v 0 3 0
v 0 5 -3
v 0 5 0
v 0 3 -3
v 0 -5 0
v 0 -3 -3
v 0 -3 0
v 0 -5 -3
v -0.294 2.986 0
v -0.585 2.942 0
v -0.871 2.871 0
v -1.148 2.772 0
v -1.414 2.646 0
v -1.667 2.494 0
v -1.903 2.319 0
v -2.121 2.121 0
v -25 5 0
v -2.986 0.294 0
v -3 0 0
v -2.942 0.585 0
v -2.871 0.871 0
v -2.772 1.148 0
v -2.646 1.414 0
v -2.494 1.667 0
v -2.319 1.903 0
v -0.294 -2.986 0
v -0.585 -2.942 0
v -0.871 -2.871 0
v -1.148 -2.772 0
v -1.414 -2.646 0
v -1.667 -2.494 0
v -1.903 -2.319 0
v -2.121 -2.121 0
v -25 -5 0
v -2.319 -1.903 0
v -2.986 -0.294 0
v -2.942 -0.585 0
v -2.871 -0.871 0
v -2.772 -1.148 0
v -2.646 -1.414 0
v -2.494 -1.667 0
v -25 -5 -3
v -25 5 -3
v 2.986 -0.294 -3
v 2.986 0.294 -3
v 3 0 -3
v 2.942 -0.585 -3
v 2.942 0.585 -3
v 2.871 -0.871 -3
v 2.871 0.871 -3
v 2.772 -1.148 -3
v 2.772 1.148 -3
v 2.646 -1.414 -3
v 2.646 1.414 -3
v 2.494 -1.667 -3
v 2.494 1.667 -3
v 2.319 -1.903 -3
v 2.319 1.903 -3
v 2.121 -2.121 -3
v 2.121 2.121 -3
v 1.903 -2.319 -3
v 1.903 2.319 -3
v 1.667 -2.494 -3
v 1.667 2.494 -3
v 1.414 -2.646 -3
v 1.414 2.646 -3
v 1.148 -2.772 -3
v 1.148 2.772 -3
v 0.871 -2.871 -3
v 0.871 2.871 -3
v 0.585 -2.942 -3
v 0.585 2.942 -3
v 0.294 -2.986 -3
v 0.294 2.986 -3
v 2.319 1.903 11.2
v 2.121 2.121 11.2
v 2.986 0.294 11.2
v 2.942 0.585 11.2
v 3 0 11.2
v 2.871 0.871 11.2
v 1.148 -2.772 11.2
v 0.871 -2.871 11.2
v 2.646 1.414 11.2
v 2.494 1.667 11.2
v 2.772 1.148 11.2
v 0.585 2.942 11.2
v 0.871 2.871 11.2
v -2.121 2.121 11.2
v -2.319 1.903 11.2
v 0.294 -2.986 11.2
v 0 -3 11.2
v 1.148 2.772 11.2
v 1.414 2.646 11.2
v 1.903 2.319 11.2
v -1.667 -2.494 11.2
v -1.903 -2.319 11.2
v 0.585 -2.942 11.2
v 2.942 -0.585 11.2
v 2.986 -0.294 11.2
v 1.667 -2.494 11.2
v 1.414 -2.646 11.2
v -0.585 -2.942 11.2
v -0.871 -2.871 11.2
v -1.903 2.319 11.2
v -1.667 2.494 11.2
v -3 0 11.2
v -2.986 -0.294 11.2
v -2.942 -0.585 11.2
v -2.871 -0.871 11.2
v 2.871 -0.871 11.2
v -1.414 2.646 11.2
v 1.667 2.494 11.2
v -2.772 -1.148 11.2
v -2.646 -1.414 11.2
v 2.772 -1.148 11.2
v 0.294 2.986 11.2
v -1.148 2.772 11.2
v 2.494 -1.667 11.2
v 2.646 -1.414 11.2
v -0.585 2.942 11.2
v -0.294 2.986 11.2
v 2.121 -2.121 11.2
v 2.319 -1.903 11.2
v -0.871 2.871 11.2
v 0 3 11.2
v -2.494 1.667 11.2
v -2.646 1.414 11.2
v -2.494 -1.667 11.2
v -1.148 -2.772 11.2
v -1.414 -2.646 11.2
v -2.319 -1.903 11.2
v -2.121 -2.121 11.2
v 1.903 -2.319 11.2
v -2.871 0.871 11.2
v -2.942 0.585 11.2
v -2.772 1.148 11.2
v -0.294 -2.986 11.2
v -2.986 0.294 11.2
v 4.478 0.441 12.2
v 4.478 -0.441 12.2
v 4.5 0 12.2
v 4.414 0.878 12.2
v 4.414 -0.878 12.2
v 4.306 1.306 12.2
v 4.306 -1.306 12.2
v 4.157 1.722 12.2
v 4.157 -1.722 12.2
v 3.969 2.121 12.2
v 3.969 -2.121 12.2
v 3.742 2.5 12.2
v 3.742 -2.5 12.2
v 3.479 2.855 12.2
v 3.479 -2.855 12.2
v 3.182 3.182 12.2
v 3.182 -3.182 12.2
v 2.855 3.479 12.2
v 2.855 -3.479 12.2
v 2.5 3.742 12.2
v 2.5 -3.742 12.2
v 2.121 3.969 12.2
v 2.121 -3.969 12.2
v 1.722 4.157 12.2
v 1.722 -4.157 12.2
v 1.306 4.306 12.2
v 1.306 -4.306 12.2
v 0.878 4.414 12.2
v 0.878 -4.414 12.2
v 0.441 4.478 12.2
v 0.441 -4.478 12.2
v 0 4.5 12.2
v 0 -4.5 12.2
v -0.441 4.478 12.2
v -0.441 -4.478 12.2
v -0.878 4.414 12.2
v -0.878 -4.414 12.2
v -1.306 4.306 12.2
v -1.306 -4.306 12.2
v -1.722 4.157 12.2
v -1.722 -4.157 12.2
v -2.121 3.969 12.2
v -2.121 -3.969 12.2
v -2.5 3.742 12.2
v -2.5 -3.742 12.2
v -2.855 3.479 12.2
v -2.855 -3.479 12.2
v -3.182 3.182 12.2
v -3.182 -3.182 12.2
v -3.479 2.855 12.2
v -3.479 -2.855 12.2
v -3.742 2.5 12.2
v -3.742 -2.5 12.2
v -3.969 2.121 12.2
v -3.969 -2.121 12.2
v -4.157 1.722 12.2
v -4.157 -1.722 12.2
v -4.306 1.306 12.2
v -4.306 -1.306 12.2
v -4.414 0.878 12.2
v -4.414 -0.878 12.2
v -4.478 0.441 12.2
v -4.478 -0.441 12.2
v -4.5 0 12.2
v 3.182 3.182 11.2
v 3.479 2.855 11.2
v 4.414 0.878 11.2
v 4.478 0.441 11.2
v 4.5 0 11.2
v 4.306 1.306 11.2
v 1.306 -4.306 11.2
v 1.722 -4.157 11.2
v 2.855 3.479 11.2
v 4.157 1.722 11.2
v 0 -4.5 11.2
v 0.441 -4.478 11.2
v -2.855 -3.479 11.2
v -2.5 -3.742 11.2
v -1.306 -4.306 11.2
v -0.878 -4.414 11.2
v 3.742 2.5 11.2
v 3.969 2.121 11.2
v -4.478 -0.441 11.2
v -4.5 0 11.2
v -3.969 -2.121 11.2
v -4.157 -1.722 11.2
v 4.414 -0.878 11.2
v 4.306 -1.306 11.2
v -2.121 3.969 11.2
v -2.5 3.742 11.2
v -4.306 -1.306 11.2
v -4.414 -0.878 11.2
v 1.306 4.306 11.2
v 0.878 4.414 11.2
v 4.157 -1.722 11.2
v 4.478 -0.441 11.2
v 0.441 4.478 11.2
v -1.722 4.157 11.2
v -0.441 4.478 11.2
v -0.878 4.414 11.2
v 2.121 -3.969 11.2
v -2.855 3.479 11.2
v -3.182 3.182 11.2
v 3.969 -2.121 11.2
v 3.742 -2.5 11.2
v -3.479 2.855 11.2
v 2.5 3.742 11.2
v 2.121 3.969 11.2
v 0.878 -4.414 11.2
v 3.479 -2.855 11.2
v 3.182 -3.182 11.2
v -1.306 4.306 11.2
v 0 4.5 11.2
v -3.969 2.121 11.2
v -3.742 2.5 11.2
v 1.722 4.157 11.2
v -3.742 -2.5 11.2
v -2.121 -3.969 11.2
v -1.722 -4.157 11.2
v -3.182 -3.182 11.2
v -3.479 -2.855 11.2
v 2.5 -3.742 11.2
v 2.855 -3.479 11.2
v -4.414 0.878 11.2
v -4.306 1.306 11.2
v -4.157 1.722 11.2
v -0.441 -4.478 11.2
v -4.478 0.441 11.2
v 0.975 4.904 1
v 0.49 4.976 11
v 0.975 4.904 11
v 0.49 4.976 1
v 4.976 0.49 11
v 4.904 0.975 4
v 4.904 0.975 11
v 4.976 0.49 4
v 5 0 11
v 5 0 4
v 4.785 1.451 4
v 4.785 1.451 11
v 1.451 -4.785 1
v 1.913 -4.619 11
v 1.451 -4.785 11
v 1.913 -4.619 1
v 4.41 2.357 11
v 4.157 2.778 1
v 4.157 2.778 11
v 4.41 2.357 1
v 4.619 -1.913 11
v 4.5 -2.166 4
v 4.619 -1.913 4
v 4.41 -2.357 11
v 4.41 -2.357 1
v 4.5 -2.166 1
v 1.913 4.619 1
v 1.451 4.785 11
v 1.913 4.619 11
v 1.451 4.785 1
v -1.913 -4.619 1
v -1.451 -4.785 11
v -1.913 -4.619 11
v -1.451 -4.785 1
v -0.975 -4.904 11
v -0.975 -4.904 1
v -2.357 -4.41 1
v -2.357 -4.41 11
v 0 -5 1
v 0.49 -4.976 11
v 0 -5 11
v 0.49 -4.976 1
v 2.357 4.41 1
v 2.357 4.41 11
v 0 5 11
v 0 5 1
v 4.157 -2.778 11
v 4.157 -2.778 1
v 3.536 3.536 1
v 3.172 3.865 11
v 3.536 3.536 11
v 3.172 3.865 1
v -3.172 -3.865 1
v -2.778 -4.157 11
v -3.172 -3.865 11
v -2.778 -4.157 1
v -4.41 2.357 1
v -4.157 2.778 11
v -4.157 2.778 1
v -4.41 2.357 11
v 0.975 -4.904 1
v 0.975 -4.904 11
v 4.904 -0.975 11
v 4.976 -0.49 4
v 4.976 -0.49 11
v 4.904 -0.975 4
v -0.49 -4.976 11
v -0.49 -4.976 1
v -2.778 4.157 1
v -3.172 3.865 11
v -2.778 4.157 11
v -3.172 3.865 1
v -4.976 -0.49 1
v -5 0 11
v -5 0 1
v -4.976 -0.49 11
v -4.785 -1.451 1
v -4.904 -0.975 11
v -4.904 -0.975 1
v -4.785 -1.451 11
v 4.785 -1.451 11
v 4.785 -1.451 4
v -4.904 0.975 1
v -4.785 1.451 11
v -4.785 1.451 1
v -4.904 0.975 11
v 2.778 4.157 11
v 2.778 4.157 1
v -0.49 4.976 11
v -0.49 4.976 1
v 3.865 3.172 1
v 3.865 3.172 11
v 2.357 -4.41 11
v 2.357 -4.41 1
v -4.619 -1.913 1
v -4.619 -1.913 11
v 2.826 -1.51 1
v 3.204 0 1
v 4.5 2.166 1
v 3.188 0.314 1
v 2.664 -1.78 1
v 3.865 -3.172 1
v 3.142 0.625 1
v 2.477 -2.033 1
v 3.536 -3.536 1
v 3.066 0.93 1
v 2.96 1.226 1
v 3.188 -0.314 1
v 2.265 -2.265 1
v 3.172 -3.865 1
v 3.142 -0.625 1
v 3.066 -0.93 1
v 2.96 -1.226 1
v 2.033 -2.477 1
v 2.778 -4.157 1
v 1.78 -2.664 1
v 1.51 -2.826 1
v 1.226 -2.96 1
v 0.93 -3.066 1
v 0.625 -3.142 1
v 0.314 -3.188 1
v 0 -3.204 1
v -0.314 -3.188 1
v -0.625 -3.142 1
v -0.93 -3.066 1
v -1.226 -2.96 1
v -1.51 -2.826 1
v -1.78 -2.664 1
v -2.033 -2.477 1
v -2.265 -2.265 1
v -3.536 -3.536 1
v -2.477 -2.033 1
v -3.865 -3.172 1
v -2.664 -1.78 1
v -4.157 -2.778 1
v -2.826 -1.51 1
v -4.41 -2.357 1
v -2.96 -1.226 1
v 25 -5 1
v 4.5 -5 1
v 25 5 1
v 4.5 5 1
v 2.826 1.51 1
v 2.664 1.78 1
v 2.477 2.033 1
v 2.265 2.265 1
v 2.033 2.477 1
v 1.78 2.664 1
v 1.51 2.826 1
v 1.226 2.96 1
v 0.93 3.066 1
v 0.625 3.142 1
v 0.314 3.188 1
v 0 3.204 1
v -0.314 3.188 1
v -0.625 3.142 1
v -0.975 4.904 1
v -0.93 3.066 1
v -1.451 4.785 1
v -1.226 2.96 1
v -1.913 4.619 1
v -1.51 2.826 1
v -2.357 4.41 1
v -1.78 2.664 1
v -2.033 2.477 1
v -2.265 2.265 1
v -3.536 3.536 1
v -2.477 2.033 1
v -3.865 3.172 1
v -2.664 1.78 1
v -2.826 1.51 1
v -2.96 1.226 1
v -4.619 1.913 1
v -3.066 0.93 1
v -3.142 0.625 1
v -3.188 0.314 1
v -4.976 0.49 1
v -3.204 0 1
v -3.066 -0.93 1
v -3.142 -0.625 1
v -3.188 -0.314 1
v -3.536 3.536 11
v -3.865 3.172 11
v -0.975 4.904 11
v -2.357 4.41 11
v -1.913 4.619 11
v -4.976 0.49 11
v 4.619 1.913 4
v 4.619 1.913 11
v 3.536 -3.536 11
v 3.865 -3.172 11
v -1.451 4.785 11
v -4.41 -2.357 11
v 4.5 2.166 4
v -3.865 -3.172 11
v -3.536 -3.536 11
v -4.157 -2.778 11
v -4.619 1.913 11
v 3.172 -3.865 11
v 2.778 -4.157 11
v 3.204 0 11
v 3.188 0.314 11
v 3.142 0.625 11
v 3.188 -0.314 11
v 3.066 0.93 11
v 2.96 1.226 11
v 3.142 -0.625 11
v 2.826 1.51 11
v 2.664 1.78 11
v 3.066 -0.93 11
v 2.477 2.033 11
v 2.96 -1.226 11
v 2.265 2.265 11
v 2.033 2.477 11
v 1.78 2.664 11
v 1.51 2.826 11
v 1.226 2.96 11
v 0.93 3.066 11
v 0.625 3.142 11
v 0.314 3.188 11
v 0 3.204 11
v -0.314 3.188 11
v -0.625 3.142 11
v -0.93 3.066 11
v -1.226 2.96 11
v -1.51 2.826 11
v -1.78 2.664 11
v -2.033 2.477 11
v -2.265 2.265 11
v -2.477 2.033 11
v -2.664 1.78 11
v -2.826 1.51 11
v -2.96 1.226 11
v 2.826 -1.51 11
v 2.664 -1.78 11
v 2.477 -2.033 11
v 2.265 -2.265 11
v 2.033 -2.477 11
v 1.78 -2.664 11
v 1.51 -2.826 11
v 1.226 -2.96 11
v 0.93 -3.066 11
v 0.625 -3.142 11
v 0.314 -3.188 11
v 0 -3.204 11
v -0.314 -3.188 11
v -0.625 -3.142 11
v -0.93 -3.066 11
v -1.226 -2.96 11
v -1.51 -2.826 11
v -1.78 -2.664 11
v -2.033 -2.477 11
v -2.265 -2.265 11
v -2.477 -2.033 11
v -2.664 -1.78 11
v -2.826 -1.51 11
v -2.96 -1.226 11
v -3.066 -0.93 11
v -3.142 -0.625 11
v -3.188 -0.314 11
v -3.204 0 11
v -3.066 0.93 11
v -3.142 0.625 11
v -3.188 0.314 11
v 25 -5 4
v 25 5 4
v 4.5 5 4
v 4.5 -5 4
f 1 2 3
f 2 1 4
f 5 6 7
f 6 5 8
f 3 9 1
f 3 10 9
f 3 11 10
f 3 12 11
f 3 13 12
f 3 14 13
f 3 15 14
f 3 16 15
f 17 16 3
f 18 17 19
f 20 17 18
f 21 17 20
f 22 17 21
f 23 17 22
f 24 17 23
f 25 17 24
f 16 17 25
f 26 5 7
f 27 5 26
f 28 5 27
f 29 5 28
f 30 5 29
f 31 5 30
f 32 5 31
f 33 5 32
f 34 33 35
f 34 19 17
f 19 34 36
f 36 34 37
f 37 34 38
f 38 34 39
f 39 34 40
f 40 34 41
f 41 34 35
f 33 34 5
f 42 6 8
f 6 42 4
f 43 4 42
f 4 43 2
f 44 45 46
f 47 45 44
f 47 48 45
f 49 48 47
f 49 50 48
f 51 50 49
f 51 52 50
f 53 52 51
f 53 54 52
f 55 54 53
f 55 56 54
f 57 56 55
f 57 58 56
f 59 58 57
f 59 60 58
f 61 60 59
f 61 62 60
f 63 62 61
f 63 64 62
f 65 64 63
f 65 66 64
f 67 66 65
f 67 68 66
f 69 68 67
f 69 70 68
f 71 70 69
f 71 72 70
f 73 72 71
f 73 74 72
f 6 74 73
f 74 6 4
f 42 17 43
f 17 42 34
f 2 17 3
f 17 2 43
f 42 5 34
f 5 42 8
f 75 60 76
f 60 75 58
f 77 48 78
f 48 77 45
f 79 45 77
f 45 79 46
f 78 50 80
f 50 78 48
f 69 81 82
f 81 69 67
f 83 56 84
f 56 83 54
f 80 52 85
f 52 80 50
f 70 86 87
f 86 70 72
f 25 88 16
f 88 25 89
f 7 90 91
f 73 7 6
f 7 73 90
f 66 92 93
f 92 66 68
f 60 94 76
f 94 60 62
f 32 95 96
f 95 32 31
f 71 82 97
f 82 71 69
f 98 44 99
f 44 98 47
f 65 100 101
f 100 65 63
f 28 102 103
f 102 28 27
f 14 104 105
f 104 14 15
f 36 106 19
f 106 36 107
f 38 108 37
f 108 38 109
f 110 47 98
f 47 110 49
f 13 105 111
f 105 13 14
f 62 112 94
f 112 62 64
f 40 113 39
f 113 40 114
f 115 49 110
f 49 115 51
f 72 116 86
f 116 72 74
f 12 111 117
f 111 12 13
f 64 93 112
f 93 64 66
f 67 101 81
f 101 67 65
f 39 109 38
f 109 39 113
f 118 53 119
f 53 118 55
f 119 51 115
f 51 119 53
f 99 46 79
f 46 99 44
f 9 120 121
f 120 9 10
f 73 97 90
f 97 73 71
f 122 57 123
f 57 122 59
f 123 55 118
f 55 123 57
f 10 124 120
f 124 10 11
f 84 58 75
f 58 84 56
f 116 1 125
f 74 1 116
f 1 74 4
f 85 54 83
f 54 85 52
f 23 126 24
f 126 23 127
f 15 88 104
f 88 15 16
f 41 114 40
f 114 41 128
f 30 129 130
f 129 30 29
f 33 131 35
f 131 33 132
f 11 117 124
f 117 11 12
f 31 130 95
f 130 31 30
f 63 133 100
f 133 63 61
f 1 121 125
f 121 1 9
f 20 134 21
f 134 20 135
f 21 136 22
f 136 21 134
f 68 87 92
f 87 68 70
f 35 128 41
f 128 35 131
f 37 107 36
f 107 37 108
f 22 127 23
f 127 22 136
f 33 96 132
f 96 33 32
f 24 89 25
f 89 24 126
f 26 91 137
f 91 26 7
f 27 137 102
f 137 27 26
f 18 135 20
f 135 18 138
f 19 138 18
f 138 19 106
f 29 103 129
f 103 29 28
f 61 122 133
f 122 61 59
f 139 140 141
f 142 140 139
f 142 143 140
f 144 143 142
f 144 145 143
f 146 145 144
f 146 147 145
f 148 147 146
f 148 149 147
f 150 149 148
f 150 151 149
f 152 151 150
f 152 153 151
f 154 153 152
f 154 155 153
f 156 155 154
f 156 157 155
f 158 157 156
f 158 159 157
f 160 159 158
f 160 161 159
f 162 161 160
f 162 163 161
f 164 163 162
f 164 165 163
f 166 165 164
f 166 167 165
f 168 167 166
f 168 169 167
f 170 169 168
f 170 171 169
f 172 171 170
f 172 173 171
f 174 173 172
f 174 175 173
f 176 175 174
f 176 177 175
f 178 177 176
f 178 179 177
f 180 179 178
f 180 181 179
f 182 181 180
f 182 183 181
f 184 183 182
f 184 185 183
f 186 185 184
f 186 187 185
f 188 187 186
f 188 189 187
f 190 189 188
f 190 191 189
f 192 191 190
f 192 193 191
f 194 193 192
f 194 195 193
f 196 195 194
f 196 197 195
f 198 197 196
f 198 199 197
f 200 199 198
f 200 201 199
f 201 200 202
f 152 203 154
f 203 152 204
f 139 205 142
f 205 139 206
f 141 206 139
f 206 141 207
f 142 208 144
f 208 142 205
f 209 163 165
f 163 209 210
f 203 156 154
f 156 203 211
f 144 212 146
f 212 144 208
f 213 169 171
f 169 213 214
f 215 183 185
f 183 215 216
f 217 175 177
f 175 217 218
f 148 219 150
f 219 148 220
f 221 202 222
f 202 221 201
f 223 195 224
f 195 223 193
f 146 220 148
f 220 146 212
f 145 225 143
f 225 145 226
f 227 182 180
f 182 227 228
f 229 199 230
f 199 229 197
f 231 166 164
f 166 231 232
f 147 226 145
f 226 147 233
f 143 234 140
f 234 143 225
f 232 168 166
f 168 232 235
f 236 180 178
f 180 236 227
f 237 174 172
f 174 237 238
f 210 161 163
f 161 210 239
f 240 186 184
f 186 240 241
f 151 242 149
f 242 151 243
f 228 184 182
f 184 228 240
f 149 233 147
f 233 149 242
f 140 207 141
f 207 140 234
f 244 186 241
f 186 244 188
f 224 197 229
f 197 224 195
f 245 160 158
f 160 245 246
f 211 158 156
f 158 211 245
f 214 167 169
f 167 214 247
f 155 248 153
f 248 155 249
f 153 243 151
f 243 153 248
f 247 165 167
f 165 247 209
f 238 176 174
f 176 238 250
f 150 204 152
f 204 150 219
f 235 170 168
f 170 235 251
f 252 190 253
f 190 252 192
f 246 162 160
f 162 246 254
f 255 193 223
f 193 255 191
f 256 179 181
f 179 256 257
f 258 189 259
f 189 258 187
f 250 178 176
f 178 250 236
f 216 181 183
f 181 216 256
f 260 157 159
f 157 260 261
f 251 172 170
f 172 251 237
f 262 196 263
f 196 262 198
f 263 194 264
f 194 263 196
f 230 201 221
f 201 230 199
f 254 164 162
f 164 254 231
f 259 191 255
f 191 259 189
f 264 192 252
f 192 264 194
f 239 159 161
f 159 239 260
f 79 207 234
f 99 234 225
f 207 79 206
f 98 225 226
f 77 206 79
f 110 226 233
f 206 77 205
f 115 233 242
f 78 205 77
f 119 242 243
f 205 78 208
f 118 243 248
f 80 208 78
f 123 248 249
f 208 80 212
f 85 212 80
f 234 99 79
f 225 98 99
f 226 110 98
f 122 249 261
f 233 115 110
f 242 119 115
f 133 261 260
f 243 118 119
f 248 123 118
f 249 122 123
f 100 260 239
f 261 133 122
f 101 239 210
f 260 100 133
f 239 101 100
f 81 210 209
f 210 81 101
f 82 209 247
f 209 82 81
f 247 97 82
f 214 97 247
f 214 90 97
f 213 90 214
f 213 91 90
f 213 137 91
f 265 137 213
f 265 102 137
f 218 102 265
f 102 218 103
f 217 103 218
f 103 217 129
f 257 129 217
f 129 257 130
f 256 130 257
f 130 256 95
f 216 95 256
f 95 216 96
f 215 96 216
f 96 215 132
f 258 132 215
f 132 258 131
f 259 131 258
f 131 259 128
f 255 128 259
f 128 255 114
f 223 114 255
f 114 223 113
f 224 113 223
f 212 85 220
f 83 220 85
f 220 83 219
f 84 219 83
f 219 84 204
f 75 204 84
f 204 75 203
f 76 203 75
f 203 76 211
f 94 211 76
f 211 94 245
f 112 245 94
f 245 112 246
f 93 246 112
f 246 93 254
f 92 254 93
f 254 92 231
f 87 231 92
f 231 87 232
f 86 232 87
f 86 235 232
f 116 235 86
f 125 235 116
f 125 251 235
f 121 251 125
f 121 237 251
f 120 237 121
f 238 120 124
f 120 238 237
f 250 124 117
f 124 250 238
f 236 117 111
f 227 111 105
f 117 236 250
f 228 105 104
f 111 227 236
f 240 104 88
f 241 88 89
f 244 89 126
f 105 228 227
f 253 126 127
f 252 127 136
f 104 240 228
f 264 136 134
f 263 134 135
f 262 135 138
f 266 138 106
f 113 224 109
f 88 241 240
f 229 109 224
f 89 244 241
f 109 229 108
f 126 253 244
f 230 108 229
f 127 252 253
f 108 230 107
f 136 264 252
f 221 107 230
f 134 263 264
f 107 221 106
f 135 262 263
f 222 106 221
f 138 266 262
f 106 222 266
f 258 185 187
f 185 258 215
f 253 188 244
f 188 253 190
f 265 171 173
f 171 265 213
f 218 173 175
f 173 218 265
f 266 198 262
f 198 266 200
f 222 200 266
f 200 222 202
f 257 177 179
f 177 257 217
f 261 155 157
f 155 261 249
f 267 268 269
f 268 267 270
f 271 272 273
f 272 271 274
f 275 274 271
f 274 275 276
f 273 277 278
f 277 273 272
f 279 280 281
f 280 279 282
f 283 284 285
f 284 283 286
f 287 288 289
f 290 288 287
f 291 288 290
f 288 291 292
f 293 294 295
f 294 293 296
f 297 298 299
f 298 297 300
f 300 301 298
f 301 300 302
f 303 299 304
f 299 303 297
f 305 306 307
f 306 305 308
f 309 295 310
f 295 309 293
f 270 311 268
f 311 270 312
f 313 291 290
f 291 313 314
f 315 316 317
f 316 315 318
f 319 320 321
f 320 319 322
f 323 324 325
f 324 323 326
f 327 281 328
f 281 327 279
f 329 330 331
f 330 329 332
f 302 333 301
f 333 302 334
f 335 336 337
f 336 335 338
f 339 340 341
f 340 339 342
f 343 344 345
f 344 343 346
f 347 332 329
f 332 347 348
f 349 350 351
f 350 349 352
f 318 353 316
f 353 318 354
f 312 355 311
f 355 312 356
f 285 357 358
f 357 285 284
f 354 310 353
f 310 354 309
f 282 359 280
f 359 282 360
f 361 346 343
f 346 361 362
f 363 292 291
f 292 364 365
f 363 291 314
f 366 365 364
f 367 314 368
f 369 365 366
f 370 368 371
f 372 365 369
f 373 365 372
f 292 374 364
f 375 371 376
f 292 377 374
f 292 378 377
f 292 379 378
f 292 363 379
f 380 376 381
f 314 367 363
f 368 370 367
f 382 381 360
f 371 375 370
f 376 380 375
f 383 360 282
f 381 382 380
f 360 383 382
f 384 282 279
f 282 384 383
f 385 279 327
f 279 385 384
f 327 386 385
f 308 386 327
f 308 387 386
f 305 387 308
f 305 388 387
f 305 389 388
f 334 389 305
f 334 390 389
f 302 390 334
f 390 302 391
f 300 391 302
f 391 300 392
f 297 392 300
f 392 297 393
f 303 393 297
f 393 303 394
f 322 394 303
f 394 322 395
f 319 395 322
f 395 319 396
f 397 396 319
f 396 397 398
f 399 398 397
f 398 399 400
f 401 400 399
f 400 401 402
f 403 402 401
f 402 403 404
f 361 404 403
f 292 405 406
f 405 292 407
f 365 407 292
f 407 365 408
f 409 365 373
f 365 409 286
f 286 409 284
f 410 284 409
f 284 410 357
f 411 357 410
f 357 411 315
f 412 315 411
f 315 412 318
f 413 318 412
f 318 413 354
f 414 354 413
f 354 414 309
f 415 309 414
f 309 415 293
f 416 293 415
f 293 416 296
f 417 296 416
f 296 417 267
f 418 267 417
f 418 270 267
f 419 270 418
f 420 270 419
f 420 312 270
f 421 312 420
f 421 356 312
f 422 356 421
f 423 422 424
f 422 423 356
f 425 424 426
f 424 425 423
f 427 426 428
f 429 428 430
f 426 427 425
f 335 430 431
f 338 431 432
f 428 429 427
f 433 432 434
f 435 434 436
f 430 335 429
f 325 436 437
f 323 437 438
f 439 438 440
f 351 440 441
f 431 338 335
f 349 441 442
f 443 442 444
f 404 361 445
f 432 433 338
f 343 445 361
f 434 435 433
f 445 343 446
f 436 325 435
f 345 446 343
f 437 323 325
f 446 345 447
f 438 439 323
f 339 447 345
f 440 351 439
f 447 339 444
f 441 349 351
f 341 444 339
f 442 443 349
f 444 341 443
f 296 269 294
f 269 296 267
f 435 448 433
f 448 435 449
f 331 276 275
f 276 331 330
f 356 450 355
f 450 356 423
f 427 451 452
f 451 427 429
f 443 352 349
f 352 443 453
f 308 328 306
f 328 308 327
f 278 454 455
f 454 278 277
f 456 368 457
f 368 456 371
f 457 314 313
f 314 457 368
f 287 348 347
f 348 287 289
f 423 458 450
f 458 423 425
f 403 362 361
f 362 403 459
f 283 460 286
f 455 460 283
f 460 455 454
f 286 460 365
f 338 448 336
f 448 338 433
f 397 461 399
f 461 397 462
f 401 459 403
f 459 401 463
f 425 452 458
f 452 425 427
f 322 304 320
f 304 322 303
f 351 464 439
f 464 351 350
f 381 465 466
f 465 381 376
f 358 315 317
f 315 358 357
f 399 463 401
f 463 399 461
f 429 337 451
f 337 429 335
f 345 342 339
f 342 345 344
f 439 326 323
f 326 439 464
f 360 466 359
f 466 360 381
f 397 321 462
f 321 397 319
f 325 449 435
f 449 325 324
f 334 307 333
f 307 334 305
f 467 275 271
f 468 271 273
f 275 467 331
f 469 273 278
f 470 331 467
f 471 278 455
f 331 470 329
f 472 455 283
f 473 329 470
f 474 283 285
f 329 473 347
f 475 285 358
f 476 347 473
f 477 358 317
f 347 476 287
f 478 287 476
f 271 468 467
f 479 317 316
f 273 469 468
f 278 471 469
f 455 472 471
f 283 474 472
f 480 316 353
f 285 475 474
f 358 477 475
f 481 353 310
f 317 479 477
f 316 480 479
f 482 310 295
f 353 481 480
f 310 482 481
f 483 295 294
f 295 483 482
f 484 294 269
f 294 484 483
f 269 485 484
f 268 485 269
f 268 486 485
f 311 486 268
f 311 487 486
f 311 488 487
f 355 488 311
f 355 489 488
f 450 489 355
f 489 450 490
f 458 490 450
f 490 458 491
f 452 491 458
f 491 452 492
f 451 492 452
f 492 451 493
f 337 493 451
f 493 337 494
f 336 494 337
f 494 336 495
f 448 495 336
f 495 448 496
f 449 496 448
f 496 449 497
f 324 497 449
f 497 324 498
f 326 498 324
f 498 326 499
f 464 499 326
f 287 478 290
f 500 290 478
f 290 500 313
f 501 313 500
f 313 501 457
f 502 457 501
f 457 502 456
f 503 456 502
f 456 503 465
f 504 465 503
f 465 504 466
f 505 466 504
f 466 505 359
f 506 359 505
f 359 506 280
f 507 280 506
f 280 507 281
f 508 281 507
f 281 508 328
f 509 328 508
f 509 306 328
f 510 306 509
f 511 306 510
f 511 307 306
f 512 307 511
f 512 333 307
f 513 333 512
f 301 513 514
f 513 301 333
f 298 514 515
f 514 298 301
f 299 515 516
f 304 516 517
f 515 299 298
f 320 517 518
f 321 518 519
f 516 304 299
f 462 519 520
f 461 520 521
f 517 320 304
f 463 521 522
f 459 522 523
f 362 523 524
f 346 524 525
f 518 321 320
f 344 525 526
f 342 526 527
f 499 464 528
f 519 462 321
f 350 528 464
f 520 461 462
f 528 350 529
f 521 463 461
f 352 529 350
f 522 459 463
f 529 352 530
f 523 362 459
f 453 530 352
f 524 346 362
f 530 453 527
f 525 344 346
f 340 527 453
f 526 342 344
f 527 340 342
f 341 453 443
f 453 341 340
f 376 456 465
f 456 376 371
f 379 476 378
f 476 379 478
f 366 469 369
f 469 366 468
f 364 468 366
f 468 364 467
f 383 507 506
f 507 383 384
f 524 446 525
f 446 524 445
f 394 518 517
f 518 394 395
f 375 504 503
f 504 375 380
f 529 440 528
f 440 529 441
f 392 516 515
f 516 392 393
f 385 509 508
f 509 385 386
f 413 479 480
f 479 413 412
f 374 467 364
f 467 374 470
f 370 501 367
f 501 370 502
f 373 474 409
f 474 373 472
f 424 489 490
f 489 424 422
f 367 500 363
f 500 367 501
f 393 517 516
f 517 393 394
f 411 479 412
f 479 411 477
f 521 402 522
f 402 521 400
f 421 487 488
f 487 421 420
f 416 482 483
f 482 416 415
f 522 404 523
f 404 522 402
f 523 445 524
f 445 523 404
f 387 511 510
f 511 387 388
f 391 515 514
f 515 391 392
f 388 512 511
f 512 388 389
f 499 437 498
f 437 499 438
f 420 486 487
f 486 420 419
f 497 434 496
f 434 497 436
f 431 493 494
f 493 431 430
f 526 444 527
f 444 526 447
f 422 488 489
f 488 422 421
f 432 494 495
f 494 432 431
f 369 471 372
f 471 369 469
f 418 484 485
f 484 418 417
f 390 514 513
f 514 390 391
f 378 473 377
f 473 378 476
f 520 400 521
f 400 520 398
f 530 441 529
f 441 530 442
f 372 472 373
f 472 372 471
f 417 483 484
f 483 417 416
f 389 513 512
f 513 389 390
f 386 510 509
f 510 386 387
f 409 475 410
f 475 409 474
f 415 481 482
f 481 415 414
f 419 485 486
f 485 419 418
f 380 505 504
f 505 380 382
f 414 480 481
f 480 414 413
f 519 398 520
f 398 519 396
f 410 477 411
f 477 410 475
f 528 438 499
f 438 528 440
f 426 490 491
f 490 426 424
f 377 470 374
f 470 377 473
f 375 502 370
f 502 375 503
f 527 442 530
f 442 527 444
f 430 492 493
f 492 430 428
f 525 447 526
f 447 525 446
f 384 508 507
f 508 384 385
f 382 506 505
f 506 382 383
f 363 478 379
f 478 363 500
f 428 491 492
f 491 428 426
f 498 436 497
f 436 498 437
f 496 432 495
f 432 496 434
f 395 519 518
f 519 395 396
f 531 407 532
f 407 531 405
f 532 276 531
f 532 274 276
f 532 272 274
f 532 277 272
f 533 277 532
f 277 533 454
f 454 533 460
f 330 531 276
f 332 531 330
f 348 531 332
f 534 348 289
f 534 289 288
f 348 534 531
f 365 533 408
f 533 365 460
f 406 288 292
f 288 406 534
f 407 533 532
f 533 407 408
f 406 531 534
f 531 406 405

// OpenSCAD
// Reference submission for hinge-captured-45.
//
// The pin runs past the knuckle and carries a head above it. The 0.2 mm gap
// between the knuckle top (z = 11) and the head bottom (z = 11.2) is what makes
// the part separable at the assembled pose; pulling 2 mm closes that gap and
// the head blocks the knuckle annulus, so `axial-retention` passes.
//
// This is the trade-off the task states: the part is captured, so it is not
// axially removable and no disassembly-path is required.
agentscad_part = "all";
hinge_angle = 0;   // pose control: the benchmark re-renders the moving part at this angle
$fn = 64;

bore_d = 6.40 / cos(180 / $fn);

module fixed_leaf() {
  union() {
    translate([-25, -5, -3]) cube([25, 10, 3]);
    translate([0, 0, -3]) cylinder(h = 15.2, d = 6);      // pin, top at 12.2
    translate([0, 0, 11.2]) cylinder(h = 1, d = 9);        // retention head, 11.2 .. 12.2
  }
}

module moving_leaf() {
  union() {
    difference() {
      translate([0, 0, 1]) cylinder(h = 10, d = 10);       // knuckle, 1 .. 11
      translate([0, 0, 0.9]) cylinder(h = 10.2, d = bore_d);
    }
    translate([4.5, -5, 1]) cube([20.5, 10, 3]);
  }
}

module generated_part() {
  if (agentscad_part == "all" || agentscad_part == "fixed") fixed_leaf();
  if (agentscad_part == "all" || agentscad_part == "moving") rotate([0, 0, hinge_angle]) moving_leaf();
}

generated_part();
